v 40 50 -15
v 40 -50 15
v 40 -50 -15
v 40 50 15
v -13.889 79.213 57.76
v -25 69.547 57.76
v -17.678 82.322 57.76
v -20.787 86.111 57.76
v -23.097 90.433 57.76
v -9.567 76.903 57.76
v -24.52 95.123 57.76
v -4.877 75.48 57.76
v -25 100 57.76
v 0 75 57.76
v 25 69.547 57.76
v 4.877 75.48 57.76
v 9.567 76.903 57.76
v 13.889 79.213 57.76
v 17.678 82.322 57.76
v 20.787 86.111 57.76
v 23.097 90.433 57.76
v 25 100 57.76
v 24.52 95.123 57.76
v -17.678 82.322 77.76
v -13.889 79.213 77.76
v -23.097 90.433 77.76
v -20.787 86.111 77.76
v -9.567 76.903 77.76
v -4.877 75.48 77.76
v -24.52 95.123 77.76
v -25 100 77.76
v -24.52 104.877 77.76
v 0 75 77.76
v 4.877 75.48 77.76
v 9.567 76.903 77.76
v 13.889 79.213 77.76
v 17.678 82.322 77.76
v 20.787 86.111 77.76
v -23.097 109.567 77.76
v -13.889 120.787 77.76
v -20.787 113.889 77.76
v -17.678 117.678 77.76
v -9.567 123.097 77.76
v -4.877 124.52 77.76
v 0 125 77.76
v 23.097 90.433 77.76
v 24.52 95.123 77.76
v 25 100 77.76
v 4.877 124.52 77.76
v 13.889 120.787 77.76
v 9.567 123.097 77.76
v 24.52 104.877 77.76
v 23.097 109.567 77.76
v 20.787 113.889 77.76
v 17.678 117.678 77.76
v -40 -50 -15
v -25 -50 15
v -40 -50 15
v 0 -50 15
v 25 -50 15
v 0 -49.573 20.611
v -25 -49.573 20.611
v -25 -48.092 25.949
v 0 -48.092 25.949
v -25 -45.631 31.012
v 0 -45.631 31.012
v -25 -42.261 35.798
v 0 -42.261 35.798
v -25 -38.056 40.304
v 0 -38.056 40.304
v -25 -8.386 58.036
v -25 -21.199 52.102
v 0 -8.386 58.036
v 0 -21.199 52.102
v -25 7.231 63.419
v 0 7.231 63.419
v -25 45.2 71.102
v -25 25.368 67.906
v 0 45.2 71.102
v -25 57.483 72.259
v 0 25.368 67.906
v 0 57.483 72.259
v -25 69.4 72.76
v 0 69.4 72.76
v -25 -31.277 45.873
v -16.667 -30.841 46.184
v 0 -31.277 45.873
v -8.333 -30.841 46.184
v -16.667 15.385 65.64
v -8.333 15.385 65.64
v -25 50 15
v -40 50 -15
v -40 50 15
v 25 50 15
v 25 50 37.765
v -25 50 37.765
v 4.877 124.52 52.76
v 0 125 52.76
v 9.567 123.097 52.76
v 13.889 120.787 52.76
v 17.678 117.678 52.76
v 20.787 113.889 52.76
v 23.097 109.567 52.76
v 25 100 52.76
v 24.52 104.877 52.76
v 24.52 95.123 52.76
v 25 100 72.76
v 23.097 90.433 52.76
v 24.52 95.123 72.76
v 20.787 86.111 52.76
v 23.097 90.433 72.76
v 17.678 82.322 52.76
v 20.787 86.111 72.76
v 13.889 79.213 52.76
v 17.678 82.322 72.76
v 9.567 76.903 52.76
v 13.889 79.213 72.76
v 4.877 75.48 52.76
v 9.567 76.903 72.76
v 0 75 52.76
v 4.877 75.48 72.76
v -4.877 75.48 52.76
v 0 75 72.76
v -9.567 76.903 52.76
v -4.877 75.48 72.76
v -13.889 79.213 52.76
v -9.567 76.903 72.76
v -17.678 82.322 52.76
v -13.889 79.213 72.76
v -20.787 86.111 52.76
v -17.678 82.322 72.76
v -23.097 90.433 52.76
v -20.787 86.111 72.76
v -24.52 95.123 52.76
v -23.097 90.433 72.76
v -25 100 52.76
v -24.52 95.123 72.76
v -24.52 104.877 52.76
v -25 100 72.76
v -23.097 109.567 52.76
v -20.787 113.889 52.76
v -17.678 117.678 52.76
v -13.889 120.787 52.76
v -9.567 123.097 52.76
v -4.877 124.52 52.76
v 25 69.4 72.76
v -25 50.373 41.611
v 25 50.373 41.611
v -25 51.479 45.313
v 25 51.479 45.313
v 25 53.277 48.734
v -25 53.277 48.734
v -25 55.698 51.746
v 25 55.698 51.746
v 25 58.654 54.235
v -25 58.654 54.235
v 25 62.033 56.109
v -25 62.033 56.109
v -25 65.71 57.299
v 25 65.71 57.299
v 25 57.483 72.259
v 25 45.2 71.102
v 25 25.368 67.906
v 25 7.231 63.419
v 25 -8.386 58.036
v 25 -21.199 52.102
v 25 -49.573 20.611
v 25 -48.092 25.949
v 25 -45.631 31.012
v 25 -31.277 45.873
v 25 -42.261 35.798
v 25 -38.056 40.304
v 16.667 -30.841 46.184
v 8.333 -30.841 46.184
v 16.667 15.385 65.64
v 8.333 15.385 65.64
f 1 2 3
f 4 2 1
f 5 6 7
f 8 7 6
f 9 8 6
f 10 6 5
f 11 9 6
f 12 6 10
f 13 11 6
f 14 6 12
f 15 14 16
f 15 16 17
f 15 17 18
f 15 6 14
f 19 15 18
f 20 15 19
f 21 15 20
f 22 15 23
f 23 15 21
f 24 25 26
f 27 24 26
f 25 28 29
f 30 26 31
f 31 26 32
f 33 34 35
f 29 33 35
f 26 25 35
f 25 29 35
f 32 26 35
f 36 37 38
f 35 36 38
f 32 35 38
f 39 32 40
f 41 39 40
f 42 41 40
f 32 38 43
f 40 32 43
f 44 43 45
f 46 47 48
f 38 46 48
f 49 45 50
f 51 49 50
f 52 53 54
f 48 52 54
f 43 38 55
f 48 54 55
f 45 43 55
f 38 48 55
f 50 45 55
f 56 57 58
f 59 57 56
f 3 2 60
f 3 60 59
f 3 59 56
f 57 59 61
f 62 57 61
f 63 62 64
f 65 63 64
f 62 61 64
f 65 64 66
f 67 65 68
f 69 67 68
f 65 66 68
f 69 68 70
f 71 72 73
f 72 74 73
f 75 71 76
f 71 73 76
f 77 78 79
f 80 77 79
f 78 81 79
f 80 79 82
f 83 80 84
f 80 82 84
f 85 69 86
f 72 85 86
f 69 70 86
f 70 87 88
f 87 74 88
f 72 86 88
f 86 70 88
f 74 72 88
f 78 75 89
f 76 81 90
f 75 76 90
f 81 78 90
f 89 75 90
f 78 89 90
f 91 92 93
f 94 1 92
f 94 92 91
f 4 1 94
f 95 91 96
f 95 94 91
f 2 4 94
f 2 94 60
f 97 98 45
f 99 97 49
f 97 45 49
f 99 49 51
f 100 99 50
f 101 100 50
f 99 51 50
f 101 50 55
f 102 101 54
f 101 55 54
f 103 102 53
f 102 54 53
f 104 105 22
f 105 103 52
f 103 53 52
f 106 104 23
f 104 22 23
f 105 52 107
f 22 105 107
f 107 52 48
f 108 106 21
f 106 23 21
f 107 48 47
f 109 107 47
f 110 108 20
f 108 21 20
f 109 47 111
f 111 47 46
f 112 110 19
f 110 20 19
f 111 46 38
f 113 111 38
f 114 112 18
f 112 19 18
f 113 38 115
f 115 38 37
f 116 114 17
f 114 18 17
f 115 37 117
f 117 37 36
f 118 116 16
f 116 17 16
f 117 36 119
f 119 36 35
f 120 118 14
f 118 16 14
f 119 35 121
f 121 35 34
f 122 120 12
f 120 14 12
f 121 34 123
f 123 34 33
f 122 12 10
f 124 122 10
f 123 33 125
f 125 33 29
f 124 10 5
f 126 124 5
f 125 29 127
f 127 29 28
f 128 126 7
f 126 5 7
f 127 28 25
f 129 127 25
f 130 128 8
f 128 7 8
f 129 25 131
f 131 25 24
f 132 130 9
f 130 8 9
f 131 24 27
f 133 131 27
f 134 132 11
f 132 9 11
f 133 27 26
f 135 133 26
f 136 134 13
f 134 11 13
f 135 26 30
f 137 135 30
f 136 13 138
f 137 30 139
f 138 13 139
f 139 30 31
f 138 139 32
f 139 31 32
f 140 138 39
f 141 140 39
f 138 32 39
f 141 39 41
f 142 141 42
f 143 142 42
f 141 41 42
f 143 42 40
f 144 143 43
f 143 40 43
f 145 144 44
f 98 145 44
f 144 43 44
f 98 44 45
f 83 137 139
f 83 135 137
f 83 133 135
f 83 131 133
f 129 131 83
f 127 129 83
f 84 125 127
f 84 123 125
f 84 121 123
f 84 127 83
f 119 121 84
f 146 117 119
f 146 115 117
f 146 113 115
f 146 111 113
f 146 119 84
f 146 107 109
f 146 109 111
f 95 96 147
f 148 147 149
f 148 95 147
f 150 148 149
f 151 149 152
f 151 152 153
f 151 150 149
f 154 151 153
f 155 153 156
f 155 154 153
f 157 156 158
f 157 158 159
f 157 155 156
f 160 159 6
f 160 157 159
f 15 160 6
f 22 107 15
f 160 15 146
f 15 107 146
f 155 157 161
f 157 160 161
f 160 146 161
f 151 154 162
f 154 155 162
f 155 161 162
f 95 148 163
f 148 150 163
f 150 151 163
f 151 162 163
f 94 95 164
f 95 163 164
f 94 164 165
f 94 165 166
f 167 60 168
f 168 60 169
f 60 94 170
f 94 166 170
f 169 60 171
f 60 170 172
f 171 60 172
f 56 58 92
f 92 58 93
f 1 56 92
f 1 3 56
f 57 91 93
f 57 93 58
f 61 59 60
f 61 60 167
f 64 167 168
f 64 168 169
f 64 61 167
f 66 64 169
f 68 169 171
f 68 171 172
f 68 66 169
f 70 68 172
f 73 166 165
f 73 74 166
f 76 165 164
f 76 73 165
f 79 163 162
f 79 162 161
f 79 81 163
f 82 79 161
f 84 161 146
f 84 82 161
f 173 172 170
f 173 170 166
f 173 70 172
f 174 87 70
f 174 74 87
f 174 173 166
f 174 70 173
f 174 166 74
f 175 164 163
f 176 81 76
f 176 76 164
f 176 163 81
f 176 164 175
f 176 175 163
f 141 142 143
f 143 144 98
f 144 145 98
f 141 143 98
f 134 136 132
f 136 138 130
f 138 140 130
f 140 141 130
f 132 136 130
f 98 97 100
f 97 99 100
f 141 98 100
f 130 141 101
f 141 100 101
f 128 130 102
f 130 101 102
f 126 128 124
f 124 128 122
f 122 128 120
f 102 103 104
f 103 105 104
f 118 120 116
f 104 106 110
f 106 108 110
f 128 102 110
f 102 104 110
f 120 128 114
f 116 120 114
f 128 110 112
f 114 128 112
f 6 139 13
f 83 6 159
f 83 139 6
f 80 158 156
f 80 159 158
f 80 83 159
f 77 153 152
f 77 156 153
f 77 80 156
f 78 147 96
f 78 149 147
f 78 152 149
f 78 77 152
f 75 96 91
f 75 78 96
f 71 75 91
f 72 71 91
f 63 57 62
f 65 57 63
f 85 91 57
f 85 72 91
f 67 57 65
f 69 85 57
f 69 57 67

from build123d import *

# Parameters (mm, degrees)
F1_DEPTH = 40
F0_W     = 25
F0_H     = 15
F2_DEPTH = 25


with BuildPart() as f1:
    # F0 (on Right) → F1 (new body, symmetric)
    with BuildSketch(Plane.YZ):
        Polygon((-50, -15), (50, -15), (50, 15), (35, 15), (-50, 15), align=None)
    extrude(amount=F1_DEPTH, both=True)

    # F0 (on Right) → F2 (join, symmetric)
    with BuildSketch(Plane.YZ):
        with BuildLine():
            add(Edge.make_bspline(
                [(-50, 15), (-50.800499, 51.844761), (17.916949, 72.011843), (69.400141, 72.759509)],
                knots=[0, 0, 0, 0, 132.636927, 132.636927, 132.636927, 132.636927], degree=3))
            Line((-50, 15), (35, 15))
            Line((35, 15), (35, 37.76465))
            ThreePointArc((35, 37.76465), (45.040081, 62.300388), (69.400141, 72.759509))
        make_face()
        with BuildLine():
            Line((35, 15), (50, 15))
            Line((50, 15), (50, 37.76465))
            ThreePointArc((50, 37.76465), (55.698448, 51.745552), (69.546562, 57.759509))
            Line((69.546562, 57.759509), (75, 57.759509))
            Line((75, 57.759509), (75, 72.759509))
            Line((75, 72.759509), (69.400141, 72.759509))
            ThreePointArc((69.400141, 72.759509), (45.040081, 62.300388), (35, 37.76465))
            Line((35, 37.76465), (35, 15))
        make_face()
        with Locations((87.5, 65.259509)):
            Rectangle(F0_W, F0_H)
    extrude(amount=F2_DEPTH, both=True)

    # F0 (on Right) → F3 (revolve)
    with BuildSketch(Plane.YZ):
        Polygon((100, 77.759509), (100, 72.759509), (100, 57.759509), (100, 52.759509), (125, 52.759509), (125, 77.759509), align=None)
    revolve(axis=Axis((0, 100, 65.259509), (0, 0, -1)))


solid = f1.part
